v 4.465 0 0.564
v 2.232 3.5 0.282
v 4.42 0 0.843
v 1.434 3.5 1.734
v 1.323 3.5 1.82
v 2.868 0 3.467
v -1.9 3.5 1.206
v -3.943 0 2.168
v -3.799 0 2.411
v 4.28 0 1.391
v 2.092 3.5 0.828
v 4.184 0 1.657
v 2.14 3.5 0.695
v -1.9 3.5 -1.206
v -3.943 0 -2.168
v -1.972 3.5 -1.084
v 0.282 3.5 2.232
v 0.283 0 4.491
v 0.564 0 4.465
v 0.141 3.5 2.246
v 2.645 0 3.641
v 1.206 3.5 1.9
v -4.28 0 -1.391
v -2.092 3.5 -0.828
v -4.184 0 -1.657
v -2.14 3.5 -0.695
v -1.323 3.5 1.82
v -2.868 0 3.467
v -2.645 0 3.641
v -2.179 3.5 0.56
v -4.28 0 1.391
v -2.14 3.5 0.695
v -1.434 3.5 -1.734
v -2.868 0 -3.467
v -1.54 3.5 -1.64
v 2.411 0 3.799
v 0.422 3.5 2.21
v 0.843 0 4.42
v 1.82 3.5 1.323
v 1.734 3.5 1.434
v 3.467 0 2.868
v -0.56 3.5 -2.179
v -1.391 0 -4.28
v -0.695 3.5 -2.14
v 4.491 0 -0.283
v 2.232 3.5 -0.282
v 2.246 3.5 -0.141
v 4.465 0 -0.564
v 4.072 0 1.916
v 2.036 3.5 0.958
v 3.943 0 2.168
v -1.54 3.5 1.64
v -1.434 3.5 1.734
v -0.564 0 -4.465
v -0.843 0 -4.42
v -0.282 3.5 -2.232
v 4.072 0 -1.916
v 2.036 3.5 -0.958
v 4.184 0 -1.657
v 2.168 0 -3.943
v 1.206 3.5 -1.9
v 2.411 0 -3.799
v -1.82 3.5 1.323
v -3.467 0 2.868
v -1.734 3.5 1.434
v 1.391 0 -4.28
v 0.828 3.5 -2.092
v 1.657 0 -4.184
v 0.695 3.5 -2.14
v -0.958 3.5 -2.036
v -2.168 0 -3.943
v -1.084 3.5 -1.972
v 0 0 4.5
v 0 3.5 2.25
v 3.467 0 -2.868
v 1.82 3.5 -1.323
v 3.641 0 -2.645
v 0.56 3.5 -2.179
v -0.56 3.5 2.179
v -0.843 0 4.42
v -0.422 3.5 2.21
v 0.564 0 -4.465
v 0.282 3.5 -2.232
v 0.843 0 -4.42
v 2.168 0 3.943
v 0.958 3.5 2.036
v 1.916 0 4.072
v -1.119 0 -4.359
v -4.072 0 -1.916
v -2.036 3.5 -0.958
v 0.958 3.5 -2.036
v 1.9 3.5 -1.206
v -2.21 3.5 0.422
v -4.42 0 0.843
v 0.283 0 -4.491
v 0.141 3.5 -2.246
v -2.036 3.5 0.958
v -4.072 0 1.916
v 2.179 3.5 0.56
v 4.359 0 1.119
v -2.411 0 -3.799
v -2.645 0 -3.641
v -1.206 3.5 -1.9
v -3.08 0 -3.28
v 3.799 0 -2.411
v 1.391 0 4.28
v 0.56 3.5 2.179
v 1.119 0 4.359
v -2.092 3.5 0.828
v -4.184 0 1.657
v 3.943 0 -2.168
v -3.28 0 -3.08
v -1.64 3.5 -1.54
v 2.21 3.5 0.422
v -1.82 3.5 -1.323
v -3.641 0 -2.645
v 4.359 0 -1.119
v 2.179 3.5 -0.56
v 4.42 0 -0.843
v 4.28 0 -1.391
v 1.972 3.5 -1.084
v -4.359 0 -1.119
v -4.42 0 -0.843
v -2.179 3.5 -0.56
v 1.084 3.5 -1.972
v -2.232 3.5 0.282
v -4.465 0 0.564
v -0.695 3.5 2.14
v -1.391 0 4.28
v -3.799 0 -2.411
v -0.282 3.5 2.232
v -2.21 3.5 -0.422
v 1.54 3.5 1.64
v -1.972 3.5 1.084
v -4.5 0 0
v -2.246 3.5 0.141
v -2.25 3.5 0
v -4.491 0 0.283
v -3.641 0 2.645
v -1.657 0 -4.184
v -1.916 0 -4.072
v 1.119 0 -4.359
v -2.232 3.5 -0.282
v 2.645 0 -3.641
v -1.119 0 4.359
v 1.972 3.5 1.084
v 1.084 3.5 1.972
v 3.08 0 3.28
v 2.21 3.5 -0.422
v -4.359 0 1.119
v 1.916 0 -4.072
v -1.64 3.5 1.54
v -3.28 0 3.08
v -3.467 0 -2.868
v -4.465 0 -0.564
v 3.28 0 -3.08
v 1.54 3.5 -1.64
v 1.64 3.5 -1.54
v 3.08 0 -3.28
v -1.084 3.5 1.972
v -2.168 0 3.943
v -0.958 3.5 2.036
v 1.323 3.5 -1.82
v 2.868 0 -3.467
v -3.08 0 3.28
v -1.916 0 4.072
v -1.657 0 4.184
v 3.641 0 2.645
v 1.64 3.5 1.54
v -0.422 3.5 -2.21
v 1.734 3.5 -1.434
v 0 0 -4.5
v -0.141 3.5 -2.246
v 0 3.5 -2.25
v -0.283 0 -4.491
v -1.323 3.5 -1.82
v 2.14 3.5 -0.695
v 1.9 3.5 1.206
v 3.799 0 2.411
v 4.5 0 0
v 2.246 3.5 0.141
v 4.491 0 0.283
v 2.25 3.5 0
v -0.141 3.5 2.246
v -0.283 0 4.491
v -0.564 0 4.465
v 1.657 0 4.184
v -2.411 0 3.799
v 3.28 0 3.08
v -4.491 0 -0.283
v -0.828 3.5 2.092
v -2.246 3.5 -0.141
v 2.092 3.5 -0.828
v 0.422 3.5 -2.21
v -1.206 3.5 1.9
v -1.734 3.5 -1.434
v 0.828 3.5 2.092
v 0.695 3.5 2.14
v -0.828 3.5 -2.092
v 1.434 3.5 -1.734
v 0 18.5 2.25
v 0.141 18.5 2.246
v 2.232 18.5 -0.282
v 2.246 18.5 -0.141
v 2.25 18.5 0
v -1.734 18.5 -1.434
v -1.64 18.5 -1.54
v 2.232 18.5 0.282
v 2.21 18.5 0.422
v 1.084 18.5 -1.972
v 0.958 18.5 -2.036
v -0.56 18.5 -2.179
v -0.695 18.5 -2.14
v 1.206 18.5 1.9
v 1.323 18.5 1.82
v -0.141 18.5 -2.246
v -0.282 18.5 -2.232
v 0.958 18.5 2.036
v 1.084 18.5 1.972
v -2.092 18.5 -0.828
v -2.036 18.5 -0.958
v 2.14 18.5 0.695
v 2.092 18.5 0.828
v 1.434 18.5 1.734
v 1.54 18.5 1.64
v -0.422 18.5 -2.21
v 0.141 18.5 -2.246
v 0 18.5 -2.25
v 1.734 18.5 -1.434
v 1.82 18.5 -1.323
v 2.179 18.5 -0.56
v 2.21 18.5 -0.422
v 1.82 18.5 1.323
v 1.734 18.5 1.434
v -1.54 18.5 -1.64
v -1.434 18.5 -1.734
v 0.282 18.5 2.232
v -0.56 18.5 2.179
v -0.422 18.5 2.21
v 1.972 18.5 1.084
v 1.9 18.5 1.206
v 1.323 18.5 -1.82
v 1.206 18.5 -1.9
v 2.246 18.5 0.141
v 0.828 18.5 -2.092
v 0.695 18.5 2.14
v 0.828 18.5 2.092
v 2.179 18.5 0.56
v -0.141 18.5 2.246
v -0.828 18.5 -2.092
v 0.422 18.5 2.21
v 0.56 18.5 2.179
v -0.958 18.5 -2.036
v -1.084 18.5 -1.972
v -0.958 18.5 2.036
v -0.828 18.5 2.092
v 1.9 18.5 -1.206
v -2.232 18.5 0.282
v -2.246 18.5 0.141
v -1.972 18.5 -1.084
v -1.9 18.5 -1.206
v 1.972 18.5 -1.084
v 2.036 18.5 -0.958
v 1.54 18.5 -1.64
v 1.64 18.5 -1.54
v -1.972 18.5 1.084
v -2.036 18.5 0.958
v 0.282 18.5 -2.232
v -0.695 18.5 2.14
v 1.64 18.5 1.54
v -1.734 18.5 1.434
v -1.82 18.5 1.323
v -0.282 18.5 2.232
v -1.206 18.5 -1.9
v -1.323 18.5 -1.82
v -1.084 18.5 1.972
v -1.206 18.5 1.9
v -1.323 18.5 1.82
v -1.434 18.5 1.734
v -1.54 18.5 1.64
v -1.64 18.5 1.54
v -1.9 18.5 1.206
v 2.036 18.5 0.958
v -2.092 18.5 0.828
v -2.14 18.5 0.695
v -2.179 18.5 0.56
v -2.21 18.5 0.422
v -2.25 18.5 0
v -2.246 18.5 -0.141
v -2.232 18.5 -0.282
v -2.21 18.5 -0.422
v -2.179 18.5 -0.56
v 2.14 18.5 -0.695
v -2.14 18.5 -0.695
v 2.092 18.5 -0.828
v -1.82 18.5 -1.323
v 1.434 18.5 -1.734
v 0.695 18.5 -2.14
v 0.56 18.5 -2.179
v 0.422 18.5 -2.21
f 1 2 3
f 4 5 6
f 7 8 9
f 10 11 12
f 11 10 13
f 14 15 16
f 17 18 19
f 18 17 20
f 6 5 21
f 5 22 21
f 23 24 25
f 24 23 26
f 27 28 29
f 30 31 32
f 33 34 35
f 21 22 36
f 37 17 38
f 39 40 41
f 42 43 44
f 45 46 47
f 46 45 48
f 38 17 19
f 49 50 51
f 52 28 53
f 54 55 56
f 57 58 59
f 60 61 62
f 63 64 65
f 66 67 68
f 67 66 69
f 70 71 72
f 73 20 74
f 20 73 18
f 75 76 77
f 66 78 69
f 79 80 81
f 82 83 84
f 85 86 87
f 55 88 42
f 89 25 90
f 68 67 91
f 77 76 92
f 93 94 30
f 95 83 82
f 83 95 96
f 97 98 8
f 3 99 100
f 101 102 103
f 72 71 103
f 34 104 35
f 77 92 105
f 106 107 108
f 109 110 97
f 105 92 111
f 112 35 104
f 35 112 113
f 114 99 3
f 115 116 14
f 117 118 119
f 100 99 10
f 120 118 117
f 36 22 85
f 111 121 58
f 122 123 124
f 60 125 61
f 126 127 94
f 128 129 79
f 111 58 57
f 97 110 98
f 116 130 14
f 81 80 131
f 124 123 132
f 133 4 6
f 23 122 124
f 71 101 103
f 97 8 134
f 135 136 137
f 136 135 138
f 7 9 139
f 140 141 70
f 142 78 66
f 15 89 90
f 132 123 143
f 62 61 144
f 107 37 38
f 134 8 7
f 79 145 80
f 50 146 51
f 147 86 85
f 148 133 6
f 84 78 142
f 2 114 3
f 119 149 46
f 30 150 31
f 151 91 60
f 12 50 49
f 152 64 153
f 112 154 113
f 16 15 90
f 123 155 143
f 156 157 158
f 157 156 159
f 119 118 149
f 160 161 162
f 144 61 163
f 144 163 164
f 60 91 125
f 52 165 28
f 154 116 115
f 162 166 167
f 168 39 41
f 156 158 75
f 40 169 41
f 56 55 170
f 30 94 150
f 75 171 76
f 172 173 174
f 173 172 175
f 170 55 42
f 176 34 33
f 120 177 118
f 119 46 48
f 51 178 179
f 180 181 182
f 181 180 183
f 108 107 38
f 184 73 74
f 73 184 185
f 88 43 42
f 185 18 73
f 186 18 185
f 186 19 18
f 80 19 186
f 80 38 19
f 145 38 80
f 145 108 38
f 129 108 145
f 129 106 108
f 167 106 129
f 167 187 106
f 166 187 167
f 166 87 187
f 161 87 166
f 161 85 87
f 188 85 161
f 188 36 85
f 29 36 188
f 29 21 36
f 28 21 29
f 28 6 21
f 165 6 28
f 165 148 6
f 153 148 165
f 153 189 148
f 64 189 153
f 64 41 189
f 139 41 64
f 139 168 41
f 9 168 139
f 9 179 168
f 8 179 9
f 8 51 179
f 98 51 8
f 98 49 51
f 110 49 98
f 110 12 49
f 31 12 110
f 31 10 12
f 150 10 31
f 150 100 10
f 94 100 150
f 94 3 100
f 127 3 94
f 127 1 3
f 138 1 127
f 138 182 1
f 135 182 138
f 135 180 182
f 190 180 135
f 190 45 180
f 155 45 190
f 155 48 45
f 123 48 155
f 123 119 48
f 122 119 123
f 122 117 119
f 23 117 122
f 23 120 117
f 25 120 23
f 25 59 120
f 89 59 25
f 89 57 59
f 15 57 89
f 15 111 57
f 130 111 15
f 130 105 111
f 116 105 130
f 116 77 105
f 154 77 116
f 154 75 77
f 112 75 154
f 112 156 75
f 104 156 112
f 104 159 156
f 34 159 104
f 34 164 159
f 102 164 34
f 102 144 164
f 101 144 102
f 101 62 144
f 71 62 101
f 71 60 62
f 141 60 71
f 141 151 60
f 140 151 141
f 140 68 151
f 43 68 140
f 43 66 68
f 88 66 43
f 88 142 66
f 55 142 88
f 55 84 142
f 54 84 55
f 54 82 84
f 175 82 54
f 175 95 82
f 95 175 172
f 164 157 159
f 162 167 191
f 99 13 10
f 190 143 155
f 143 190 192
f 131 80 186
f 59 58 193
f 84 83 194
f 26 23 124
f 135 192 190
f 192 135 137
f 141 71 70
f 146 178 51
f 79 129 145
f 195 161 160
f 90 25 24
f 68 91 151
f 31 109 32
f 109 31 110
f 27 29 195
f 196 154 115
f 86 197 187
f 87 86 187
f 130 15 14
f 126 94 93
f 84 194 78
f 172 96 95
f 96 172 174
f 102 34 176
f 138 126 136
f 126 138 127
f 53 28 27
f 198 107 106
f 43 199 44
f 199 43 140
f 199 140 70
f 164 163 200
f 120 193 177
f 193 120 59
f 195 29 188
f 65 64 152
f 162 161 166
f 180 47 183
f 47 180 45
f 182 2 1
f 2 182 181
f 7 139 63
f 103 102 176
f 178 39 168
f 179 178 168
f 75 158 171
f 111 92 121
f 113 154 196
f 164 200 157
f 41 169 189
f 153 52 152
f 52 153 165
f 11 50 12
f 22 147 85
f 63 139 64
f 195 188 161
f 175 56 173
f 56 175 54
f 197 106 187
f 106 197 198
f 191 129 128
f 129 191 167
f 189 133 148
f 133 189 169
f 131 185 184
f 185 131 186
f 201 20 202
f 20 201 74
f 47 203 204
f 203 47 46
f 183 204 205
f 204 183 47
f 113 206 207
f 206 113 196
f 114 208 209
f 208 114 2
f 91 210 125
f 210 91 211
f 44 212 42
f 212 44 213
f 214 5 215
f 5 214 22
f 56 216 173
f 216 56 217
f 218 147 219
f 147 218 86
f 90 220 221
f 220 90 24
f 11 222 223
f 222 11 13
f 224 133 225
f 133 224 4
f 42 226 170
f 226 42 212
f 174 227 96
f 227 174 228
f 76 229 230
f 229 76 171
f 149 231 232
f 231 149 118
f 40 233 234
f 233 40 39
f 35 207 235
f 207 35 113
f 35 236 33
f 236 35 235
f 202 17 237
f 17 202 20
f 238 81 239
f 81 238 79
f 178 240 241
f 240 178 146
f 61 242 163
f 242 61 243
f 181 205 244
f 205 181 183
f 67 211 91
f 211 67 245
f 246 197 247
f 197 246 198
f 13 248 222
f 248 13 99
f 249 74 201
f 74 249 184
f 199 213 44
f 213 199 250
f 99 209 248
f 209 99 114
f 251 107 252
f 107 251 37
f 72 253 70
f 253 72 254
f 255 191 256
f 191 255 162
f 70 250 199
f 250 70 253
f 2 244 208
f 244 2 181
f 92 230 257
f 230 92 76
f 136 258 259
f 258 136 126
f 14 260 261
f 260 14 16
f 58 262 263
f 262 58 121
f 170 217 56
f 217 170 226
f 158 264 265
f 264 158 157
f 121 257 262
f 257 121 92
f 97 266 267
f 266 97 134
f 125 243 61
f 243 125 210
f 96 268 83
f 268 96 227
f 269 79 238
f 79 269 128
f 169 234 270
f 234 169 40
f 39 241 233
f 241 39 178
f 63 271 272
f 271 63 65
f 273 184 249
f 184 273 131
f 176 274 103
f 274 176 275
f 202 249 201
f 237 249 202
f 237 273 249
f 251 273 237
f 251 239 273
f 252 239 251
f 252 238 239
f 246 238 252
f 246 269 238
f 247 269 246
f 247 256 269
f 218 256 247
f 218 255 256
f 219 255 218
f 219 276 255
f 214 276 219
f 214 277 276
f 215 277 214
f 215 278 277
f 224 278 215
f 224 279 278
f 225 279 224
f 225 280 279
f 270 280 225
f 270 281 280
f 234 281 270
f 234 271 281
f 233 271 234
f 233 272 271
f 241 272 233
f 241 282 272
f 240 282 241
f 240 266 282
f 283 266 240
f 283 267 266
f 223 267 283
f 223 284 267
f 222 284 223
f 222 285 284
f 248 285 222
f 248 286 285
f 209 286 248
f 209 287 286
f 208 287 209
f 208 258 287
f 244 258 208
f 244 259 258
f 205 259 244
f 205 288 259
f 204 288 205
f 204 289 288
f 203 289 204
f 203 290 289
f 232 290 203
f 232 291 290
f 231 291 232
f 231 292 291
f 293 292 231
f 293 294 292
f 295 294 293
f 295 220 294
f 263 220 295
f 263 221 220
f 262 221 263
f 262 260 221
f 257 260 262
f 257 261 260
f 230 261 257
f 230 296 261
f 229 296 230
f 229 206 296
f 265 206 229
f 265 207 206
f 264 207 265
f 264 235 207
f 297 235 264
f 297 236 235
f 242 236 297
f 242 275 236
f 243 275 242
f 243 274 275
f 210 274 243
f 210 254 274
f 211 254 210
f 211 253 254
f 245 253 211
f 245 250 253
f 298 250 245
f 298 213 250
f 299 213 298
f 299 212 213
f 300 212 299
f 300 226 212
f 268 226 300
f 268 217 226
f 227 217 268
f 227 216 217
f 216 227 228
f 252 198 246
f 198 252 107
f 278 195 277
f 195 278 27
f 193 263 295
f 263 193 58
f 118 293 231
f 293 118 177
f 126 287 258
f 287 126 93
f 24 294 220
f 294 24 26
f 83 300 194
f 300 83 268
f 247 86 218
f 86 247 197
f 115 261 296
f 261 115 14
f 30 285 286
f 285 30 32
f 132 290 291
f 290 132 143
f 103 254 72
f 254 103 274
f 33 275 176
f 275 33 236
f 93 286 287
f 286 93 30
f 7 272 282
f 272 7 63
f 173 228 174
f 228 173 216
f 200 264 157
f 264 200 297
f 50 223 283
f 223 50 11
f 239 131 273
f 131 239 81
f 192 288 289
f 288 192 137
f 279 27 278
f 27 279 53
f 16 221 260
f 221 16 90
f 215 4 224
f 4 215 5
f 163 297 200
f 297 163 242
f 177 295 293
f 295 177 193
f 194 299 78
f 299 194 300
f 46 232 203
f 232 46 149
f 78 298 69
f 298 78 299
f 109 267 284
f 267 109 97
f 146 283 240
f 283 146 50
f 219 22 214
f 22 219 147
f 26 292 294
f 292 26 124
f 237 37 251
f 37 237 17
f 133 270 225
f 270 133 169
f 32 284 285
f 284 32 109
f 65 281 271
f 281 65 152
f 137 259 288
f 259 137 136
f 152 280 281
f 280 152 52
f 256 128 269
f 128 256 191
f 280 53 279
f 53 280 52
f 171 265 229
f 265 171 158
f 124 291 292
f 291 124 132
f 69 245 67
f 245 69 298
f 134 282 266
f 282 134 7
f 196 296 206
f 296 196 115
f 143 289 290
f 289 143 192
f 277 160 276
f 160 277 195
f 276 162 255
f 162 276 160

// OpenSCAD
/*
use <../_bohr_senk.scad>;
*/

bohr_senk(d=4.5, d2=9, h=15, h_senk=3.5, axis="y", dir=1);

module bohr_senk(x=0, y=0, z=0, h=15, d=4.2+0.3, d2=9, h_senk=3.5, axis="y", dir=1, fn=100, ) {
    // Positionierung mit translate
    translate([x, y, z]) {
        // Rotation je nach Achse
        rotate(axis == "y" ? [270 * dir, 0, 0] : 
               axis == "x" ? [0, 90 * dir, 0] : 
               [90 - 90*dir, 0, 0]) {
            // Senkung (größerer Durchmesser)
            cylinder(h = h_senk, d1=d2, d2=d, $fn=fn);
            // Bohrloch (kleinerer Durchmesser)
            translate([0, 0, h_senk]) {
                cylinder(h = h, d = d, $fn=fn);
            }
        }
    }
}
